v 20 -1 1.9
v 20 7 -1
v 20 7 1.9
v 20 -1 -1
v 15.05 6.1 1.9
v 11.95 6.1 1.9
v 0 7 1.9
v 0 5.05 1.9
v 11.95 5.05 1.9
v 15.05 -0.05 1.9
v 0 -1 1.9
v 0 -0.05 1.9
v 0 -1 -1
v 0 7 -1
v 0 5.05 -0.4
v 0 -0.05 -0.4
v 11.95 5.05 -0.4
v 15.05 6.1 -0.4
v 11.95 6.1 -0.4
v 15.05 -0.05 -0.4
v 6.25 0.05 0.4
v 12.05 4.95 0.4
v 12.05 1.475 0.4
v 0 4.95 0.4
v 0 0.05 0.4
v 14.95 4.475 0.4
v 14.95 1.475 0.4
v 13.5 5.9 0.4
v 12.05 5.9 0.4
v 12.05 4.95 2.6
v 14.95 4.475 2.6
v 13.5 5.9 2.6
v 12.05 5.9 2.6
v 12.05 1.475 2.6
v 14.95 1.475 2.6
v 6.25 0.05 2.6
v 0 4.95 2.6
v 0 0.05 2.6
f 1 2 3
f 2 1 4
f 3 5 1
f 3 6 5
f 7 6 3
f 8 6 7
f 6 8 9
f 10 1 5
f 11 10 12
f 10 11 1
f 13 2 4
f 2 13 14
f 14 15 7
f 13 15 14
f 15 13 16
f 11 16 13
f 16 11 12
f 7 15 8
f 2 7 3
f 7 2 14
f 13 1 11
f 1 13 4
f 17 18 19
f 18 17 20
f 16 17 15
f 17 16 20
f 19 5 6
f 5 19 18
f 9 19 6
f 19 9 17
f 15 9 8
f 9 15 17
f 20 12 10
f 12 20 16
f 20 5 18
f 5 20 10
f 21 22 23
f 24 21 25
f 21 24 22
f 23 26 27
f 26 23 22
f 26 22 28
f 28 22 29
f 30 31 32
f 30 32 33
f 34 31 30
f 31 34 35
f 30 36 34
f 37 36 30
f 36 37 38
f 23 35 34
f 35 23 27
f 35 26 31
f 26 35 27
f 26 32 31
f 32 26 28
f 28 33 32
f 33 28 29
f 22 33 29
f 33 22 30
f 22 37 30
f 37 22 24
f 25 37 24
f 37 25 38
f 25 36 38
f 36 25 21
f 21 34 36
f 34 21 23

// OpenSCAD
module clip(
	width, length, tickness, 
	teeth_height, teeth_length, 
	backlash=0.1, vbacklash=0.4
) 
{
	bl = backlash / 2;
	w = width - 2 * bl;
	l = length - bl ;
	th =teeth_height -bl;
	tl = teeth_length -2*bl;

	assert( w > teeth_height*2, "Clip tooth too high");
	assert(l > teeth_length, "Clip tooth too long");

	translate([0, bl, vbacklash])
	linear_extrude(tickness - 2*vbacklash)
	polygon([
		[0, 0],
		[0, w],
		[l - tl, w],
		[l - tl, w + th],
		[l - tl/2, w + th],
		[l, w - th/2],
		[l, 1.5* th],
		[l - tl, 1.5*th],
		[l - 3*tl, 0]
	]);

}


module clip_pocket(
	width, length, tickness, 
	teeth_height, teeth_length,
	backlash=0.1, vbacklash=0.4
)  {

	bl = backlash / 2;
	w = width + 2 * bl;
	l = length + bl ;
	th =teeth_height +bl;
	tl = teeth_length +2*bl;

	translate([0, -bl, -vbacklash])
	linear_extrude(tickness+ 2*vbacklash)
	polygon([
		[0, 0],
		[0, w],
		[l - tl, w],
		[l - tl, w + th],
		[l, w + th],
		[l , 0]
	]);

	
}

difference(){
	translate([0, -1, -1])
	cube([20, 8, 2.9]);

	clip_pocket(5, 15, 3, 1, 3);

}

color("red")
clip(5, 15, 3, 1, 3);
